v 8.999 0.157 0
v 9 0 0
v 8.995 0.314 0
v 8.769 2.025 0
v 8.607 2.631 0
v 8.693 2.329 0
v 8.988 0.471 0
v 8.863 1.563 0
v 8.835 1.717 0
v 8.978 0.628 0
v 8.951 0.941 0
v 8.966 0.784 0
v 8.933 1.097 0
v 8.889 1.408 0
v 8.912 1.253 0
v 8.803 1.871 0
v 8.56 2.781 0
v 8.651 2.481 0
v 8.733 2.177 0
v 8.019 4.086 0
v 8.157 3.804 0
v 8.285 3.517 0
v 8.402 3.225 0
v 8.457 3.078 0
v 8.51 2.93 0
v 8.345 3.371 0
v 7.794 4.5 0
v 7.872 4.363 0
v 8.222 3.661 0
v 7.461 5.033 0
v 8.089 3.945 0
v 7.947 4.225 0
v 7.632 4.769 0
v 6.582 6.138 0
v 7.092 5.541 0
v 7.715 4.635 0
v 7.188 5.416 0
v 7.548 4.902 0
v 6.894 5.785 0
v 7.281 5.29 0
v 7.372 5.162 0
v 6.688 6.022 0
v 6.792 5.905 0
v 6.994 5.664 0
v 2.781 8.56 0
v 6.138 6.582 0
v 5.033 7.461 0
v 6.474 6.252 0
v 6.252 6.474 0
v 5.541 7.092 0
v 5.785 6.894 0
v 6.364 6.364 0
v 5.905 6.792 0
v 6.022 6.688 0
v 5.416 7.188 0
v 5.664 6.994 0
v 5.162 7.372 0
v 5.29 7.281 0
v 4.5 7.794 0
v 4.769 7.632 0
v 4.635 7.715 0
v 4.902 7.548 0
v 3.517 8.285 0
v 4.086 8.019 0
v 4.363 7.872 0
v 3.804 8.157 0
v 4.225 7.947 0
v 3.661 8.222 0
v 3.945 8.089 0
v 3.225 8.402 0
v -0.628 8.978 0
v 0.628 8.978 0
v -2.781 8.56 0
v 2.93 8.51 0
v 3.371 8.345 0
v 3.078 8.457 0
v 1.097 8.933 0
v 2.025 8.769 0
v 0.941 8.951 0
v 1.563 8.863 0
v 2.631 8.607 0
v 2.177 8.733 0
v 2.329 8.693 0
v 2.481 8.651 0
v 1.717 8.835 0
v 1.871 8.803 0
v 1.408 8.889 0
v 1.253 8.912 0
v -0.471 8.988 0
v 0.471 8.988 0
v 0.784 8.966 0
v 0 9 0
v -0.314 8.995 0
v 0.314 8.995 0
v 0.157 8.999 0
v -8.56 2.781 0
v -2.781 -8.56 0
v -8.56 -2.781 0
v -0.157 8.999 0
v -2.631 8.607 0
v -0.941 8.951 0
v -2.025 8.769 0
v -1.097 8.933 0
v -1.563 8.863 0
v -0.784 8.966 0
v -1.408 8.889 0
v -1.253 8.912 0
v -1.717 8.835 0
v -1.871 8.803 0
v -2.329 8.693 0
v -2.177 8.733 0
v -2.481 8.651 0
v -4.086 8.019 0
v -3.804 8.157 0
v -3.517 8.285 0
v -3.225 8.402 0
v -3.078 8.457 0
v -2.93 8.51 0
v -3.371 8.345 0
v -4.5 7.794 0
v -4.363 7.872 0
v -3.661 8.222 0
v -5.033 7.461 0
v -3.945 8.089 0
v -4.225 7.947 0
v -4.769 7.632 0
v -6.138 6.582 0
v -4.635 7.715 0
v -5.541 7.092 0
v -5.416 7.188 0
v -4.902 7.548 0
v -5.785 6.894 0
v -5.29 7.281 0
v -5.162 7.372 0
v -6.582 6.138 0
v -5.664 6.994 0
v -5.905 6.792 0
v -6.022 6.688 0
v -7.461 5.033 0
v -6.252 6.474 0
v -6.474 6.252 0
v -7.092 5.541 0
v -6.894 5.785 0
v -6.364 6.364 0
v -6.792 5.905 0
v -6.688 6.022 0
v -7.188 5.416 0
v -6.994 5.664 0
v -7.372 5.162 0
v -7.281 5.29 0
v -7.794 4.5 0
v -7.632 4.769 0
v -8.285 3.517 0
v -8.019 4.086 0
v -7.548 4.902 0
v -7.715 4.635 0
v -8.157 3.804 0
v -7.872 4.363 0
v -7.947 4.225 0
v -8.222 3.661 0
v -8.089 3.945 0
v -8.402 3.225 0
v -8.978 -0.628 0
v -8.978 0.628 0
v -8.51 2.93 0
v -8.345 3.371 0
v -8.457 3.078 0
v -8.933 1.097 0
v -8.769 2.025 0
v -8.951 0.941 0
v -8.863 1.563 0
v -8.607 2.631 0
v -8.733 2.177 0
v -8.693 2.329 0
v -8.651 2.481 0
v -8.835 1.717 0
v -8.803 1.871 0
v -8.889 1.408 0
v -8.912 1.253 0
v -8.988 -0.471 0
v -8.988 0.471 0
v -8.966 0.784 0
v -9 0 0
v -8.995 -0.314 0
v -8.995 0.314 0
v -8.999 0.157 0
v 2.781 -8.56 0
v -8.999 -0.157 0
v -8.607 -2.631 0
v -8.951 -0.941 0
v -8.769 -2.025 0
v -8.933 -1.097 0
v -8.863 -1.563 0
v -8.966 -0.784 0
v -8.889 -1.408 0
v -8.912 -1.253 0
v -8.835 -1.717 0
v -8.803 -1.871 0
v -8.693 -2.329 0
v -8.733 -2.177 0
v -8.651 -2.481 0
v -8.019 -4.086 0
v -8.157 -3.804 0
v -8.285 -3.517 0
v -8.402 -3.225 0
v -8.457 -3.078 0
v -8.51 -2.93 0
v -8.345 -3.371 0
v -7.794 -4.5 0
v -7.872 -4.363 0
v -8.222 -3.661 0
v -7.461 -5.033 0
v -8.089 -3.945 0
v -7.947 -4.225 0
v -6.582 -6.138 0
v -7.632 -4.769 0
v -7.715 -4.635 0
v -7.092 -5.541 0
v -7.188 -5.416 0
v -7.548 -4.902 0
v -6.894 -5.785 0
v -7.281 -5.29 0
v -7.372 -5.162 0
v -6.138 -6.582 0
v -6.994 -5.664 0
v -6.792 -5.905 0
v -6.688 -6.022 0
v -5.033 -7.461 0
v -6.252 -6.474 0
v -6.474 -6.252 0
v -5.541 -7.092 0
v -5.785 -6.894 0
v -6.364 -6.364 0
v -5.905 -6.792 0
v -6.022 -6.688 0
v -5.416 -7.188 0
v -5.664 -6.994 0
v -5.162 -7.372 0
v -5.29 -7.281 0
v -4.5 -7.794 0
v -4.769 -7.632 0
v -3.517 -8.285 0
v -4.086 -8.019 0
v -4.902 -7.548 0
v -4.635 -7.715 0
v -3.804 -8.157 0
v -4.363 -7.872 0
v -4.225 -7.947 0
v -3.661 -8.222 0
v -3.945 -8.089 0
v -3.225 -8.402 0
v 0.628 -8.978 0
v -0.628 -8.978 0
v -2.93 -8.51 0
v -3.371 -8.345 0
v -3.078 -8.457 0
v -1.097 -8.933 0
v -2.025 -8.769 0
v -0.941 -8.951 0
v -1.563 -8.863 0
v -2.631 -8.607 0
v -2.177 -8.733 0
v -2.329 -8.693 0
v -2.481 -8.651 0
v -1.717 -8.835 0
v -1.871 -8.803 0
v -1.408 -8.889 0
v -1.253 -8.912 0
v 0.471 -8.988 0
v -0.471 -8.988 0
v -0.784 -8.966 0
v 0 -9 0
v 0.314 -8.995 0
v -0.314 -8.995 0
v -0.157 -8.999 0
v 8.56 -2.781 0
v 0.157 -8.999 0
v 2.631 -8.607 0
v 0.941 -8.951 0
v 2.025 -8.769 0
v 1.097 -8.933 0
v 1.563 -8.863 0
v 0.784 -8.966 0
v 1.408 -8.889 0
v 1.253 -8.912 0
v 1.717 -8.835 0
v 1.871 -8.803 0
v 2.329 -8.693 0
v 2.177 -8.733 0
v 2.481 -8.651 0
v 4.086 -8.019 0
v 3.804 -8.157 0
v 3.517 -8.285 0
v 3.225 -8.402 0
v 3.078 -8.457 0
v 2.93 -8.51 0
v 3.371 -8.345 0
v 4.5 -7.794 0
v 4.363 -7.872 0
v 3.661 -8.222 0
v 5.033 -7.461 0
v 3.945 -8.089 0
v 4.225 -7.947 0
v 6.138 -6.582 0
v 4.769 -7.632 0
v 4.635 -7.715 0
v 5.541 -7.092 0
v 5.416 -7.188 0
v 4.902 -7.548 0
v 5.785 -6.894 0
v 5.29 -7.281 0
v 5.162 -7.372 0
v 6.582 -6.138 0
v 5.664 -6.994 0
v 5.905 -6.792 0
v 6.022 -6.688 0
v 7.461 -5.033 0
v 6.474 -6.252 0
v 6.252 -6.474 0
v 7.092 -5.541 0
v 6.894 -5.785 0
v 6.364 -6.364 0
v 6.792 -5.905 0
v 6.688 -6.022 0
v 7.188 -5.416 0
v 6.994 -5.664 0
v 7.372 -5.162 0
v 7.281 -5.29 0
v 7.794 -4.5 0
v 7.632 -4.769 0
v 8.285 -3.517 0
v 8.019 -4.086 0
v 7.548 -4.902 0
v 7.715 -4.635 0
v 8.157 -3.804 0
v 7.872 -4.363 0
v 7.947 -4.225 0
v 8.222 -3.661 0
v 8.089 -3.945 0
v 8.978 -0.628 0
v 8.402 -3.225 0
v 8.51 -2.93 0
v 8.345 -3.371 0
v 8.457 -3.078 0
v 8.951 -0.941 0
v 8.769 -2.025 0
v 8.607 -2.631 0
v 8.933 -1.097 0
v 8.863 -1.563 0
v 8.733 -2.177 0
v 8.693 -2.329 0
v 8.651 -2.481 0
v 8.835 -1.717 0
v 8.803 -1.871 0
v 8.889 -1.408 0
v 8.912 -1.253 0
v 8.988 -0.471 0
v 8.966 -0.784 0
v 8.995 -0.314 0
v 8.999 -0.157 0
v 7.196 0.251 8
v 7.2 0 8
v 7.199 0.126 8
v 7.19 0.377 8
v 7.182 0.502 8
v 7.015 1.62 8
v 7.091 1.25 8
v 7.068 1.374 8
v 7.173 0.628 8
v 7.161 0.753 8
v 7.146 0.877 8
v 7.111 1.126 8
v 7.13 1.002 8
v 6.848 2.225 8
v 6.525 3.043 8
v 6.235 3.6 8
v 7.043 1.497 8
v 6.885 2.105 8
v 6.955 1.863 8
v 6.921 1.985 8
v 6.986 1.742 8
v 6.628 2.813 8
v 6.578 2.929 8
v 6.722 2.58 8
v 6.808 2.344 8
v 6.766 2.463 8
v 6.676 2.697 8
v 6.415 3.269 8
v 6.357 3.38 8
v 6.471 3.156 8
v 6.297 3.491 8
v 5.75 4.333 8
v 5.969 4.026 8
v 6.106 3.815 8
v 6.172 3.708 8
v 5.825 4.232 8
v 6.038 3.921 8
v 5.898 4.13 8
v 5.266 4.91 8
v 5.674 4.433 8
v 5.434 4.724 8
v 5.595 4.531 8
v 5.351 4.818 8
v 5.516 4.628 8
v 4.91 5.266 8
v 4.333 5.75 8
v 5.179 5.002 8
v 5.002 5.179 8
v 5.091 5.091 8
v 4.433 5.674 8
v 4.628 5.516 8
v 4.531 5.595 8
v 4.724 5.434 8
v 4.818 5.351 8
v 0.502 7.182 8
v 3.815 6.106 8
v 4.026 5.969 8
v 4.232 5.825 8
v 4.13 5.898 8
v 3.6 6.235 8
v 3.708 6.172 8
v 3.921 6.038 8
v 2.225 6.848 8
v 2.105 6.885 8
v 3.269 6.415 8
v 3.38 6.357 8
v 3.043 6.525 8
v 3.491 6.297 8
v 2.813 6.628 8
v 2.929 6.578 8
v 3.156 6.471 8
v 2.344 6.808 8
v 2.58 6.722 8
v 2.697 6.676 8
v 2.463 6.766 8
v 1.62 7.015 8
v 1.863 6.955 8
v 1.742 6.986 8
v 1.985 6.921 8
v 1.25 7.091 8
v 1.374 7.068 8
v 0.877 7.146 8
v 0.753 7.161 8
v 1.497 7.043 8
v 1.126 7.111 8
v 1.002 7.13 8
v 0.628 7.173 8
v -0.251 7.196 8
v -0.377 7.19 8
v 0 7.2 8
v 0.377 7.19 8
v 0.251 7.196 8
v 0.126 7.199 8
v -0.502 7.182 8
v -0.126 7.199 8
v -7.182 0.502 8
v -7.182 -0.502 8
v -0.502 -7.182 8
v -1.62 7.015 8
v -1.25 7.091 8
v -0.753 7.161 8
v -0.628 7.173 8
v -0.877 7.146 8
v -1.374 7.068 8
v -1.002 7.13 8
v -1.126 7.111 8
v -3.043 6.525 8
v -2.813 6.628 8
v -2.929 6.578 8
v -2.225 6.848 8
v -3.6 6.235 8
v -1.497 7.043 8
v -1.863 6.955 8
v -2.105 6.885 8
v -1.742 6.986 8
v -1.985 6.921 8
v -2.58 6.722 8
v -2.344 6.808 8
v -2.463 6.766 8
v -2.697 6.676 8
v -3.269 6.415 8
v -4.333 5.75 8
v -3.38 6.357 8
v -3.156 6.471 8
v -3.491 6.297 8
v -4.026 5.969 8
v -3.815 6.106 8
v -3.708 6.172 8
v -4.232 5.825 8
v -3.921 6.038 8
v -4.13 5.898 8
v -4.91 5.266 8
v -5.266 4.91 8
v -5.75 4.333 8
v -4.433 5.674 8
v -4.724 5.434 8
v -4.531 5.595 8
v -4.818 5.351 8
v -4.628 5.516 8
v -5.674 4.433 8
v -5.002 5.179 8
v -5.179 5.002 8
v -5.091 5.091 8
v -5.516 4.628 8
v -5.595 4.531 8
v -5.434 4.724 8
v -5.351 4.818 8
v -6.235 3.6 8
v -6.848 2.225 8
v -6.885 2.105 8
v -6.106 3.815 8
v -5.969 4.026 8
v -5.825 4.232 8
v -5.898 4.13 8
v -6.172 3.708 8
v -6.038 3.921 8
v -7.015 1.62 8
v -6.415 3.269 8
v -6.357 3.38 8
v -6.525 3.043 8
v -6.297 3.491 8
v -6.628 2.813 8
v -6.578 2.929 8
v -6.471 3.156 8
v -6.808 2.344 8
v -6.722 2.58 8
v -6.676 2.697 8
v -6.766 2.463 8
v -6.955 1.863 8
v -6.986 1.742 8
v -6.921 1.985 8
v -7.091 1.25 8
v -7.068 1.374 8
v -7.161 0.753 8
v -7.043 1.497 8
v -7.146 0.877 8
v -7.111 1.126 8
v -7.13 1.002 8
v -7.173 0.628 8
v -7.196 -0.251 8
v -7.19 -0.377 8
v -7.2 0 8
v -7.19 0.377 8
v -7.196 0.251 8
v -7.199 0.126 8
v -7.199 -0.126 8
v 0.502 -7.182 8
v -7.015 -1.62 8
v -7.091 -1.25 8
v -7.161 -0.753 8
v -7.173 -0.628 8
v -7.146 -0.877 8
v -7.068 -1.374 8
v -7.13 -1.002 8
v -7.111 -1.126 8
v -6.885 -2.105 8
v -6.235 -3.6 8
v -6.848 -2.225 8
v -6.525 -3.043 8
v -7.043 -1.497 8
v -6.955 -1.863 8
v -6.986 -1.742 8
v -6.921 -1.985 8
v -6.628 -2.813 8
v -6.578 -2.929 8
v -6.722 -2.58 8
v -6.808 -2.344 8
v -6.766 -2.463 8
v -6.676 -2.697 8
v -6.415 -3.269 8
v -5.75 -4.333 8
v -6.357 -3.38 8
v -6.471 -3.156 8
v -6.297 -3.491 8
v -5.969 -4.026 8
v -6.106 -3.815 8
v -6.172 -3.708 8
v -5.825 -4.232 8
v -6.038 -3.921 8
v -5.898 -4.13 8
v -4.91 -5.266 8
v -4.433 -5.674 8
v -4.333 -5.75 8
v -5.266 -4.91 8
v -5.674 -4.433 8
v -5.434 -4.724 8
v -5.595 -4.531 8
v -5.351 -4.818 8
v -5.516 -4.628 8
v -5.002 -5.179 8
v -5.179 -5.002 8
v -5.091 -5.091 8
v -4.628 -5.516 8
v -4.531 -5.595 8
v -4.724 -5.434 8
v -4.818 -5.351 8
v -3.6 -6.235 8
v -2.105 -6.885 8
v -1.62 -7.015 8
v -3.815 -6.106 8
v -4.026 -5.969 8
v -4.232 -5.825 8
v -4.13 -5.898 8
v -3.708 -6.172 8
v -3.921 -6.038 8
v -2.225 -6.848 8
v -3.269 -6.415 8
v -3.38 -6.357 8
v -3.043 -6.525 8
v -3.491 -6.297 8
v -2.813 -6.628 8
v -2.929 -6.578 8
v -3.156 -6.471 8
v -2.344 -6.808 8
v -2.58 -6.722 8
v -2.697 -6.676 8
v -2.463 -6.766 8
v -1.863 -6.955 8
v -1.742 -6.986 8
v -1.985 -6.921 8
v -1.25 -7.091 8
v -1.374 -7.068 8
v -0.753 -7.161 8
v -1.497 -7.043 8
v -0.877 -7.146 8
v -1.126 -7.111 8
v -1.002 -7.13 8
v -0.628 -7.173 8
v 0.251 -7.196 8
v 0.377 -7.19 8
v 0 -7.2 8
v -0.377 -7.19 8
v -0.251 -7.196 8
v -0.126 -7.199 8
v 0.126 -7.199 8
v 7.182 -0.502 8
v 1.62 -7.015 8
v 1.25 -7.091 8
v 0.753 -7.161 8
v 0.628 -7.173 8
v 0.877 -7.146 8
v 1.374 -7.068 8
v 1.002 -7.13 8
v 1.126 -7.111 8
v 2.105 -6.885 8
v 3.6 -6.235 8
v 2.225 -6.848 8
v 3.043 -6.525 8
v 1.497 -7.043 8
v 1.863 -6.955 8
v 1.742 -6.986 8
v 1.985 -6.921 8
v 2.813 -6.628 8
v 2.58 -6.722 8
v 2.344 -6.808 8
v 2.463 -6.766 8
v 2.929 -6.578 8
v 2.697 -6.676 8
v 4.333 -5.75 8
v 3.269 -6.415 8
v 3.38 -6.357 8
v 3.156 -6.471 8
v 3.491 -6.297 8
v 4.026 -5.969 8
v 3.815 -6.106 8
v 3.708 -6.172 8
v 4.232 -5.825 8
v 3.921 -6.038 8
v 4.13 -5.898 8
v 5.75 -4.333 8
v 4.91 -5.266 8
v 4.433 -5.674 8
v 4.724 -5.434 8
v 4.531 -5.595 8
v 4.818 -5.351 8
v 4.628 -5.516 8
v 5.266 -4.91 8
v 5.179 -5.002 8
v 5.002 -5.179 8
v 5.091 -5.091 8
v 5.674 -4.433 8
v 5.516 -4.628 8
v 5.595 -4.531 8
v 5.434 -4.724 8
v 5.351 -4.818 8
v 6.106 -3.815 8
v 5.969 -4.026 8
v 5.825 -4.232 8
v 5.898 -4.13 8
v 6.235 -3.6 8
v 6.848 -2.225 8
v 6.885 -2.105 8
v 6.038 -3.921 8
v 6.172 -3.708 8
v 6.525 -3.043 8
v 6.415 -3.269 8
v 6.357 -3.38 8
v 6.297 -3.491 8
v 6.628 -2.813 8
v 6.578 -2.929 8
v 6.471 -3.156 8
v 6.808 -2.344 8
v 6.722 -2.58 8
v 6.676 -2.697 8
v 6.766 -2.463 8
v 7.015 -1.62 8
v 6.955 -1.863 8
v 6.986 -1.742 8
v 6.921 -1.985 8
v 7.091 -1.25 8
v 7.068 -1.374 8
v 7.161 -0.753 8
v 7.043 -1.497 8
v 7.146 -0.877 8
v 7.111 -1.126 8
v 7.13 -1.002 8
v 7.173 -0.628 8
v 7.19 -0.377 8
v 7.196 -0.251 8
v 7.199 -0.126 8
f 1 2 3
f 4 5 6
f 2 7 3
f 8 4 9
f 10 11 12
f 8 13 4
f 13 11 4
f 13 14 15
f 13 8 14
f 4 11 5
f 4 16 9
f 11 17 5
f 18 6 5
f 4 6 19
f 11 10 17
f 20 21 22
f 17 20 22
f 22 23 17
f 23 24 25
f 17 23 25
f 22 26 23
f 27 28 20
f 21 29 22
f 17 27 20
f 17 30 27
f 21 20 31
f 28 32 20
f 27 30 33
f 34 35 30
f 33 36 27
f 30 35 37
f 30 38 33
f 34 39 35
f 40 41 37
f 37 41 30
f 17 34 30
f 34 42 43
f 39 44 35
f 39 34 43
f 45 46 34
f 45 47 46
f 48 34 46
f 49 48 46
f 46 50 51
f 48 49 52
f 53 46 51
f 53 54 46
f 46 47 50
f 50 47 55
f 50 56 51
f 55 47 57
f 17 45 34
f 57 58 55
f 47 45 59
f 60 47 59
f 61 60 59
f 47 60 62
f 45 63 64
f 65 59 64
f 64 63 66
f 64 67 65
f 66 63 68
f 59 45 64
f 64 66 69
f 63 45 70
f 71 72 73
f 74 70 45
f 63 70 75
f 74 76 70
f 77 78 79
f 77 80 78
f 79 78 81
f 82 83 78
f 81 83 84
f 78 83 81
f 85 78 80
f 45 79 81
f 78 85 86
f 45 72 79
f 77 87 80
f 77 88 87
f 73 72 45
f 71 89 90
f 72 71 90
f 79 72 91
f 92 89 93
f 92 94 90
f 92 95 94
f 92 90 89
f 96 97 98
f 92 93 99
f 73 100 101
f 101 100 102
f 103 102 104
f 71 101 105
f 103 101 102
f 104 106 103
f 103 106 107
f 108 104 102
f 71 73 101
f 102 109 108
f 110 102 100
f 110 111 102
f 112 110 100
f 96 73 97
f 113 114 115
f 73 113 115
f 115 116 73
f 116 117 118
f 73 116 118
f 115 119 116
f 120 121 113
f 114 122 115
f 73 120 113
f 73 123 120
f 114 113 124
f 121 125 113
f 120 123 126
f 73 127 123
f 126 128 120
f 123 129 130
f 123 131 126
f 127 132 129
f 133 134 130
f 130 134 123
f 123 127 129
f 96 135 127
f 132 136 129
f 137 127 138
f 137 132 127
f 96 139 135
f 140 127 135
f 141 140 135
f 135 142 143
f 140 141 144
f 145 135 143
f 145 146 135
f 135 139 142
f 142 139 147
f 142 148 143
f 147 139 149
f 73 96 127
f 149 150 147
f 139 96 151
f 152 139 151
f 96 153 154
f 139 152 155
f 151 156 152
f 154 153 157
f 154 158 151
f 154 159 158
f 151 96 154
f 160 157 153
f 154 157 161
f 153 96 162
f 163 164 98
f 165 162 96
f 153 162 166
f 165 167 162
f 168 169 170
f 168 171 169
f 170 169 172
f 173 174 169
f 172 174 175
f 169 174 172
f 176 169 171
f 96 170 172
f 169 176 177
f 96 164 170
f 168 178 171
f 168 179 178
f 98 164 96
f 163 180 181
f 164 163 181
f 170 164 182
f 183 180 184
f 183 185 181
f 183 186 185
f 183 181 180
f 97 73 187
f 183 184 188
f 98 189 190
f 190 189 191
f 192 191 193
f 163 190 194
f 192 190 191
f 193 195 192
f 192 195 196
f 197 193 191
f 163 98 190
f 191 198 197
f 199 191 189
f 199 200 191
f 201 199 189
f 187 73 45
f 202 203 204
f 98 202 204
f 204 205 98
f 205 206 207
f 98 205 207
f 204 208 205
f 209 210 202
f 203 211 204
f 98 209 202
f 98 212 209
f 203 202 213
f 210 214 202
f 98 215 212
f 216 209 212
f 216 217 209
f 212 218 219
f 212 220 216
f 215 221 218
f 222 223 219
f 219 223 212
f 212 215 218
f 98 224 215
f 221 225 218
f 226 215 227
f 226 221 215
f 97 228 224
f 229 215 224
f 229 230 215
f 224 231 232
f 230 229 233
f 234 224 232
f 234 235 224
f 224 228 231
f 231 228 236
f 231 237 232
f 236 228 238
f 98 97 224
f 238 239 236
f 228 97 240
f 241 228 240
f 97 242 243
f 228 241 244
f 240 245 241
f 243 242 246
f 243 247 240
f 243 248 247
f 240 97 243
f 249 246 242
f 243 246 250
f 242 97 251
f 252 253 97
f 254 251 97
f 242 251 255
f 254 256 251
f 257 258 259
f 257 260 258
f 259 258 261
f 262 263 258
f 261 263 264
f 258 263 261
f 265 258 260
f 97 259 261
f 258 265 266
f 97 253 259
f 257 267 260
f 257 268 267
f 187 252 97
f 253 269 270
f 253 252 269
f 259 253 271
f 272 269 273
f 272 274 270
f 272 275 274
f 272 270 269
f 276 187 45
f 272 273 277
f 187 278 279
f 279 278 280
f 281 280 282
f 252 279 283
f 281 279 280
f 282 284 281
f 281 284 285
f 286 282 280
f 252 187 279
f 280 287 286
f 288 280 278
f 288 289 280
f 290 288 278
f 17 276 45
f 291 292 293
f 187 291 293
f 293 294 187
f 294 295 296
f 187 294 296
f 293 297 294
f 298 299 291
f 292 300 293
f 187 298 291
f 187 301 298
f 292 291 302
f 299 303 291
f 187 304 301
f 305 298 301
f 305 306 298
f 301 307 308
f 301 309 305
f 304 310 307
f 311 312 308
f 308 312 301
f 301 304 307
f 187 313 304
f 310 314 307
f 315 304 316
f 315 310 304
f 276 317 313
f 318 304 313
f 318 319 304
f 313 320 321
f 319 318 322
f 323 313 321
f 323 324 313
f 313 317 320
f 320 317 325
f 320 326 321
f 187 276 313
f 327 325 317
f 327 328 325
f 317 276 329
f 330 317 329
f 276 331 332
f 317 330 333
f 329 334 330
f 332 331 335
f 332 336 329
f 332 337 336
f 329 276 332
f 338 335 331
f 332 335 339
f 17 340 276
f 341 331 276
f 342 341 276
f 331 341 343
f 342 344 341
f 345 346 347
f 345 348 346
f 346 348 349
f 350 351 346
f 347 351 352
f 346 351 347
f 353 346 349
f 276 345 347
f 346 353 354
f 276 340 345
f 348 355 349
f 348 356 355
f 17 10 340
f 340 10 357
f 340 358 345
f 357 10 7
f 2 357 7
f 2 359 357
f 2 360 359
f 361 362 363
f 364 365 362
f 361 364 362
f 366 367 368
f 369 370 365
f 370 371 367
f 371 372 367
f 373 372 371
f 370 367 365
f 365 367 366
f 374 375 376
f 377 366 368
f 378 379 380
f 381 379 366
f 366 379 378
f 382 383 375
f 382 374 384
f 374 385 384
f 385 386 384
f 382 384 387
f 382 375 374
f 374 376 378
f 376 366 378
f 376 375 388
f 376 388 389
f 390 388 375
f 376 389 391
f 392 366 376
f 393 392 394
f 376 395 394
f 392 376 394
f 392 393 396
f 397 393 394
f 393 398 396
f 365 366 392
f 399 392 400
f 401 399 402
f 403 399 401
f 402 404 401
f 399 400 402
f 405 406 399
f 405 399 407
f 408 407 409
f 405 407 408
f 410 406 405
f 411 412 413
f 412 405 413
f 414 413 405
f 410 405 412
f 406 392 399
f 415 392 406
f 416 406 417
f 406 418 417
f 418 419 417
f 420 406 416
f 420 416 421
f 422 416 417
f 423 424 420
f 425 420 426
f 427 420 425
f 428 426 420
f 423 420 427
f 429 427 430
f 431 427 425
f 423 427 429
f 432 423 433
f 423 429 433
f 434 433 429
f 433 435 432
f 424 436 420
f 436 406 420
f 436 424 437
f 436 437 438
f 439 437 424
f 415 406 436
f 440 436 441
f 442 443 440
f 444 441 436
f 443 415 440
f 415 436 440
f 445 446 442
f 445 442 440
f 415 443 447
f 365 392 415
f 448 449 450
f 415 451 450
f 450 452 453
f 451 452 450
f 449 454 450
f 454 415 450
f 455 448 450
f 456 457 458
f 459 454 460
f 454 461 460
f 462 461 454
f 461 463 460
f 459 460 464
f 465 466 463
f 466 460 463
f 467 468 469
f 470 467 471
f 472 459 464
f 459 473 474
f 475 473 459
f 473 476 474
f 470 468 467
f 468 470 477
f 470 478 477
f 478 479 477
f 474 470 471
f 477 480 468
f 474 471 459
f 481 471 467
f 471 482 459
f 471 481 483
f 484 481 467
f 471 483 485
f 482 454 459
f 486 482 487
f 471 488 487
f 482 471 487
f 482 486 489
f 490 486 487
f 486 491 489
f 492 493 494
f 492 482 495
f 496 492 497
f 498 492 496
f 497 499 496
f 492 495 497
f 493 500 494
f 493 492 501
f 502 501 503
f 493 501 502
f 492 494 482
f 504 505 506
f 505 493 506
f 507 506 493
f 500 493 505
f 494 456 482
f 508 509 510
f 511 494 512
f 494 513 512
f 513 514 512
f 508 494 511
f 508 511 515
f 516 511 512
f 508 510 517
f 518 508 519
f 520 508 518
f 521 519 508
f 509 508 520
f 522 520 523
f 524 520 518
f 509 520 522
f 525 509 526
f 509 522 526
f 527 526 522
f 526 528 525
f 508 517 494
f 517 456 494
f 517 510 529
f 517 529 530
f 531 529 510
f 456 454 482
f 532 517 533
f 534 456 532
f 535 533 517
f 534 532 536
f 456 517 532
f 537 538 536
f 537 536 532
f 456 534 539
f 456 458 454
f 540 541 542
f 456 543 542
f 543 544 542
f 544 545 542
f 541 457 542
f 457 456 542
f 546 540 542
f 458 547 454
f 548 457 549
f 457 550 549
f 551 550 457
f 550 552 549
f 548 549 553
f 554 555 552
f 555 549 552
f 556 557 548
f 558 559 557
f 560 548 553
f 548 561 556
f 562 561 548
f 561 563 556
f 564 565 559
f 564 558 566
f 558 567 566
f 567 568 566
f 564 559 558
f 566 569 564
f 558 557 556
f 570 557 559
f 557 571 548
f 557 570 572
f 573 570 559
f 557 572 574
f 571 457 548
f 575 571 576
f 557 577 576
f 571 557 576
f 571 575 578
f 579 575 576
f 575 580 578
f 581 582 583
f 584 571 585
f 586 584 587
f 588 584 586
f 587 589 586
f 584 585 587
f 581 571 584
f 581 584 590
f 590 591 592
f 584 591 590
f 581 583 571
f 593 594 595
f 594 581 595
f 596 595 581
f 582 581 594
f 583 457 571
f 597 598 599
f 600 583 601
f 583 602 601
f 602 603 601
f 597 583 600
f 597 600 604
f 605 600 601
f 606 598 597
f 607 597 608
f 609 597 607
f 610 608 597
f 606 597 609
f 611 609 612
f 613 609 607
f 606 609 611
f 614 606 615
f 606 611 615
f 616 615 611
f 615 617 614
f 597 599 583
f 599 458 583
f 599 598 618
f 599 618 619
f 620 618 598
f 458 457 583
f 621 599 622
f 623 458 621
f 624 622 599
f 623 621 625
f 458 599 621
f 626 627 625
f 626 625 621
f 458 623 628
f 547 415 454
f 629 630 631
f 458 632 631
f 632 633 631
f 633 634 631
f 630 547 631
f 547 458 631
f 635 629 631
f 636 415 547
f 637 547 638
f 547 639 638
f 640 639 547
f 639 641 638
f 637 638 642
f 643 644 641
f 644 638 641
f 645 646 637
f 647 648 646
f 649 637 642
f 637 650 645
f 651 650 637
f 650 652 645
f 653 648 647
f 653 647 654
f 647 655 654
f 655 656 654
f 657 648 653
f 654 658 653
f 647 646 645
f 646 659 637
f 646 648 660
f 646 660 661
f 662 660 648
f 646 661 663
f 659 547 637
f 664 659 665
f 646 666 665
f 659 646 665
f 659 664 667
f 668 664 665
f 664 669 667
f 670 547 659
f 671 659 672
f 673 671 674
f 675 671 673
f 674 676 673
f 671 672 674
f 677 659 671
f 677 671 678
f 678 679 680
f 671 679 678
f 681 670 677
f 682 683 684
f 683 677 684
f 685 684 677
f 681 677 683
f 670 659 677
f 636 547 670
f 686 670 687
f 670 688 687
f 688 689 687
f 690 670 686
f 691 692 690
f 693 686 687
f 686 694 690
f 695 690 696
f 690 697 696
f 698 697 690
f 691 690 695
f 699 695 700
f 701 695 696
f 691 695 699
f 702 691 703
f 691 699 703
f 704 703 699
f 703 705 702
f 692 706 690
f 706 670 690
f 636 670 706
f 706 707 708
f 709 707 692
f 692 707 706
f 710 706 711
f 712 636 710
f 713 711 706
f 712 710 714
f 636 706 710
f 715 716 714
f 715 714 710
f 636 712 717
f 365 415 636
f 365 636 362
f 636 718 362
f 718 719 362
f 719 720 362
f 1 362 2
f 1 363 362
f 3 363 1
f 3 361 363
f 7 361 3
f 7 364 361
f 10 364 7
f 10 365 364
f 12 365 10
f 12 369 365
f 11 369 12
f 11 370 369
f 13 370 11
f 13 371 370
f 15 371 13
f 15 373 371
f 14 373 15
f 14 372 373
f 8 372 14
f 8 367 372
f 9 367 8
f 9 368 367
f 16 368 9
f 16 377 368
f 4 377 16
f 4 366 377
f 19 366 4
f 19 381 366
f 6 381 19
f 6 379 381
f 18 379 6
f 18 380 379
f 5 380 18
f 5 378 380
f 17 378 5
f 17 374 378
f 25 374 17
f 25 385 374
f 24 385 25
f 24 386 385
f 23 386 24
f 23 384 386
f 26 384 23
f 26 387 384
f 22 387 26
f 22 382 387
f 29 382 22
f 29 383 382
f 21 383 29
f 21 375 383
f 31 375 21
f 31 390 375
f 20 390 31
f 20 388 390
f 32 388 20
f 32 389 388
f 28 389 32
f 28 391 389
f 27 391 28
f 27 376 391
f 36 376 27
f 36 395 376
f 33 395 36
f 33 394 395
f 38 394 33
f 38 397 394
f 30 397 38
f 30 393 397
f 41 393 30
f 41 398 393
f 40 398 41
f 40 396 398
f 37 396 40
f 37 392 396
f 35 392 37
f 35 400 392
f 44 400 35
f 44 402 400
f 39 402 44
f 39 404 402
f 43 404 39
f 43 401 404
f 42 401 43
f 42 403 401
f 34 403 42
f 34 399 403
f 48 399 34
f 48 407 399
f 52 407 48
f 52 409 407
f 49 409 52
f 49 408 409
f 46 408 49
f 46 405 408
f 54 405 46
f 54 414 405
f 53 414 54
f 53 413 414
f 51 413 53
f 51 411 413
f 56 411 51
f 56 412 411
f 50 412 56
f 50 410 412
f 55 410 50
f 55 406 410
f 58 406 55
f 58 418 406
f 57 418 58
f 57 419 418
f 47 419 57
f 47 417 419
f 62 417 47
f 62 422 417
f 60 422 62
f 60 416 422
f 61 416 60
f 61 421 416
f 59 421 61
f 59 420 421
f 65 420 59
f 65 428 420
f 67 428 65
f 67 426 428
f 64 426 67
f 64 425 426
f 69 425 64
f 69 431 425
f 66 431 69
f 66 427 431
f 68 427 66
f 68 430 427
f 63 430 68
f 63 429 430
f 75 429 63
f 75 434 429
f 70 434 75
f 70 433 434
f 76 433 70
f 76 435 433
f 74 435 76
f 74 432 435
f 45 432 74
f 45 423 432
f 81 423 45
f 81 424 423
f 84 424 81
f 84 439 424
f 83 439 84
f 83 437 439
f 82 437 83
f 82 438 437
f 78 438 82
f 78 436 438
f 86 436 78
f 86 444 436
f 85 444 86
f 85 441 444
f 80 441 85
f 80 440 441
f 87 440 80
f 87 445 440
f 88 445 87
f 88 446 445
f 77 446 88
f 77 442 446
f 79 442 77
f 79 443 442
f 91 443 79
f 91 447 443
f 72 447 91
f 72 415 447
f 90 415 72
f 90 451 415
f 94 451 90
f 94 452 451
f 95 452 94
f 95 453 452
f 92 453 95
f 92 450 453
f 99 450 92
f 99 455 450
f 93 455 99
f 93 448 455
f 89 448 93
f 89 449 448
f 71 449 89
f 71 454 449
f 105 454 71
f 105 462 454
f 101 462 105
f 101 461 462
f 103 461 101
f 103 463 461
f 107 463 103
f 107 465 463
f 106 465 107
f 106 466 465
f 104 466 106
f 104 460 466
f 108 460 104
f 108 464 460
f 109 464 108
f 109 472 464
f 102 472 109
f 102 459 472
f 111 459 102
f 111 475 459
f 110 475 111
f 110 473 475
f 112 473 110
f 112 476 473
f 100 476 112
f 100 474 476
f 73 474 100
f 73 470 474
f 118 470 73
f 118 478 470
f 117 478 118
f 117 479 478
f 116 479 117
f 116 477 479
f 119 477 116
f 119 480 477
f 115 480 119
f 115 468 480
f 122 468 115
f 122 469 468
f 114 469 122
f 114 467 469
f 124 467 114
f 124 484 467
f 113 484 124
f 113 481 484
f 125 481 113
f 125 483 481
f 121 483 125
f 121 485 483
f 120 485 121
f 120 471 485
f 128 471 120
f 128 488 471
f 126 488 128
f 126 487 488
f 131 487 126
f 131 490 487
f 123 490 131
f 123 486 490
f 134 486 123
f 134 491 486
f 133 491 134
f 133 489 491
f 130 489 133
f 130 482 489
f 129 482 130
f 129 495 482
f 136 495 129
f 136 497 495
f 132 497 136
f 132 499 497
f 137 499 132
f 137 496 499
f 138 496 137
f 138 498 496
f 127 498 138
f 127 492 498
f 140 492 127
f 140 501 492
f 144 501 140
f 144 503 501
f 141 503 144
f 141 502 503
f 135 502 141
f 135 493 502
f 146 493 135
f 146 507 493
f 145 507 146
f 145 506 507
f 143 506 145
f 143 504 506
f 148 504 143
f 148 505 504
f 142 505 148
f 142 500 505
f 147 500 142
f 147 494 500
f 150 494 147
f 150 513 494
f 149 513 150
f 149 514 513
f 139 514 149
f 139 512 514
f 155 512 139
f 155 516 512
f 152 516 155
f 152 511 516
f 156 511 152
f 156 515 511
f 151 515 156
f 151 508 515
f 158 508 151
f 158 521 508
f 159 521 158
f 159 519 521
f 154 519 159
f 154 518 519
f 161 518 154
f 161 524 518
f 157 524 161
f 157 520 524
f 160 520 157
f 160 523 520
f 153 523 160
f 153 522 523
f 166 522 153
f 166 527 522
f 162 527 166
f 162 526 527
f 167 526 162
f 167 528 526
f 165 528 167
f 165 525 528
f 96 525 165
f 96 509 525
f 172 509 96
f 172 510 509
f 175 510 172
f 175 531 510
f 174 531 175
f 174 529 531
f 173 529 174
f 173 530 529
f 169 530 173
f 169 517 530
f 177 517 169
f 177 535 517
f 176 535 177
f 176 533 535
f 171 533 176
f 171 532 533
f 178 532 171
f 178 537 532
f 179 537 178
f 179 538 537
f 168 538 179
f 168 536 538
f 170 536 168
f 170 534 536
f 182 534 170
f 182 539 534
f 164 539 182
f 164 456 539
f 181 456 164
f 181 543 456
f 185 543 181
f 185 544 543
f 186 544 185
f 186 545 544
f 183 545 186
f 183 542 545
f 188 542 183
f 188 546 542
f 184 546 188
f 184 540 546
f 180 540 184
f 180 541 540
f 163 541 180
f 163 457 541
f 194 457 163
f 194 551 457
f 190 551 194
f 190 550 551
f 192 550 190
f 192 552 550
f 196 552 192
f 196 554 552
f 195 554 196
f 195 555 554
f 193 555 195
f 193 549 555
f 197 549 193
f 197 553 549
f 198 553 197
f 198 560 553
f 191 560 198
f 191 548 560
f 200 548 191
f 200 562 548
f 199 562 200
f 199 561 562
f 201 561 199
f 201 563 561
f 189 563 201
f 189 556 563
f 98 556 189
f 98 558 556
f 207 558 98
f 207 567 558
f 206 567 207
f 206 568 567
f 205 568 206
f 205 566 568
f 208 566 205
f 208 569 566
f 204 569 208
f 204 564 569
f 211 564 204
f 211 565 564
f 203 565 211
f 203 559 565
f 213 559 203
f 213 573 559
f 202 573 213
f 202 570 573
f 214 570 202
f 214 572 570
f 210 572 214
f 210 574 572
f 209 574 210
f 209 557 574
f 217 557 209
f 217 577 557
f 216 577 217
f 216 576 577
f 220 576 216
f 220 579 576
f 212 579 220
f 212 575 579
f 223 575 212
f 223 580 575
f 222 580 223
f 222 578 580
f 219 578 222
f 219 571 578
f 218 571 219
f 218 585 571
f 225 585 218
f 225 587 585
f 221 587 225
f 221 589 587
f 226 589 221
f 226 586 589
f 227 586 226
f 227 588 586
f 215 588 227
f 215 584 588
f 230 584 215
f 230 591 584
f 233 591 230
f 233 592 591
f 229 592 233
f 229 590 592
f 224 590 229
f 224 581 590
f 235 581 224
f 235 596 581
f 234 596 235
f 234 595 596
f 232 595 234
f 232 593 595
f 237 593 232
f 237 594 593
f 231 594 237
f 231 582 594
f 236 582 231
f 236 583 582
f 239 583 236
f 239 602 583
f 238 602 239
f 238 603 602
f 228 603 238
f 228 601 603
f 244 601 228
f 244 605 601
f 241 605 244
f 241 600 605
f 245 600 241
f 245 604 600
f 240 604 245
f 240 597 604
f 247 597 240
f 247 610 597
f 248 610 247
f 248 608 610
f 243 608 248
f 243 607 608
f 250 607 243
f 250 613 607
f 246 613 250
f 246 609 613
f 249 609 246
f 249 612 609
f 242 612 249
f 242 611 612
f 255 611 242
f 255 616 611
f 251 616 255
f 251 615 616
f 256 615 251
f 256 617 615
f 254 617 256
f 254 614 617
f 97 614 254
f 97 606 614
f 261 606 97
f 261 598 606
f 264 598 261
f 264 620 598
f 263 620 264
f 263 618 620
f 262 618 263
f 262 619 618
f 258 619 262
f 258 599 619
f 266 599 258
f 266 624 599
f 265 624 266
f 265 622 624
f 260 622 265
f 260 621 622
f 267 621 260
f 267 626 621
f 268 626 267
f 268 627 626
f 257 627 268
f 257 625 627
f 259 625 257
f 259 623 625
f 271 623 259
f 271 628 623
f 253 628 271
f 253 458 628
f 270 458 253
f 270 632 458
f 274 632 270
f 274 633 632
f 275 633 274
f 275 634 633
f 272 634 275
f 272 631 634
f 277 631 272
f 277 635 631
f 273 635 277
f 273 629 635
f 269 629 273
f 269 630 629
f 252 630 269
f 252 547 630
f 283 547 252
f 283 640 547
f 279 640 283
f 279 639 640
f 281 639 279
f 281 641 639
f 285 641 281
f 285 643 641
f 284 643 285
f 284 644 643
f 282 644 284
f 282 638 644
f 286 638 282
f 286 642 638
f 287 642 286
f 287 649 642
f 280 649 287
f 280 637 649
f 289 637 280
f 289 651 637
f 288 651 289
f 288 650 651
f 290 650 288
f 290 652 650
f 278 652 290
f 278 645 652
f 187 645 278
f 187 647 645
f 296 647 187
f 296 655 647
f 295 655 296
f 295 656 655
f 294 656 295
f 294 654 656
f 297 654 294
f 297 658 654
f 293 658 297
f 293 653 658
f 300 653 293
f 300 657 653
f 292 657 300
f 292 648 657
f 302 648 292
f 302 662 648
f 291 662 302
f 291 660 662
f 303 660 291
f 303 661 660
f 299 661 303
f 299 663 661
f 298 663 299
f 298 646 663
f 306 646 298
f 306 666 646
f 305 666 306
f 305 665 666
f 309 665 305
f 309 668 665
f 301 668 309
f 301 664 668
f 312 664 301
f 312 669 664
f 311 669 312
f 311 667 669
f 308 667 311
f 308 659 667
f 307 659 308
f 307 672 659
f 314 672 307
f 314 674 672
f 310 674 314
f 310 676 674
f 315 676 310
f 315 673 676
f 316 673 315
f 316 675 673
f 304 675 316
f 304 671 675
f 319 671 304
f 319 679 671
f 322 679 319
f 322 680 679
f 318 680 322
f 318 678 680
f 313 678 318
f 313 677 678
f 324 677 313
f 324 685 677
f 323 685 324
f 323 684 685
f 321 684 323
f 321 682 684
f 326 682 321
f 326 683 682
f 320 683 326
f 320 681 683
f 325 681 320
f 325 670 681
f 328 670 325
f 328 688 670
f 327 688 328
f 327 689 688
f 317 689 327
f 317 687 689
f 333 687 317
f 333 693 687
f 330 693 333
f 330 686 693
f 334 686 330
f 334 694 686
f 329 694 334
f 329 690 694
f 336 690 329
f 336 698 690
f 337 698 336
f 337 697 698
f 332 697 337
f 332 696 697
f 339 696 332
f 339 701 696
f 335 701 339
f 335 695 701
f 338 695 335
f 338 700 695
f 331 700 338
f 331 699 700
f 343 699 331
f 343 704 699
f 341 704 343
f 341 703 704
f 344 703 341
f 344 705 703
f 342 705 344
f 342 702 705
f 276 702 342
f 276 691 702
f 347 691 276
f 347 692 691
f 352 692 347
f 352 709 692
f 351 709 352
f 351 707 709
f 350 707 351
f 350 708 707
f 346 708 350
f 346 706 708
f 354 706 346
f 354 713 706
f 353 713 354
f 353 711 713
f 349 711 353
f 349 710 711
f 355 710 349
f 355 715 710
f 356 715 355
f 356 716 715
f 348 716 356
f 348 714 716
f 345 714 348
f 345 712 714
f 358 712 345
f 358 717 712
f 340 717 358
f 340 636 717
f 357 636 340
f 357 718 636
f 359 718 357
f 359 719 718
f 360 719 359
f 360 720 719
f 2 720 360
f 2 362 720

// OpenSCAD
// file: common.scad
function shaft() = 3.77;
function nut_width() = 6.5;
function nut_thickness() = 3;
function screw_diameter() =3.25;
function m3_cap_diameter() = 5.5;
function m3_cap_height() = 3.5;

module hex_cap(){
  difference(){
    cylinder(d=3.66, h=3);
    translate([0, 0, 1.25]) cylinder(d=2, h=2, $fn=6);
  }
}

module inverse_hex_cap(){
  cylinder(d=3.66, h=0.5, $fn=360);
  cylinder(d=2, h=1, $fn=6);
}

module nema17_end(top=true, shaft_length=25.6){
  $fn=360;
  difference(){
	 union(){
      linear_extrude(height = 9){
        difference(){
          hull(){
            translate([2, 2, 0]) circle(r=2);
            translate([40.3, 2, 0]) circle(r=2);
            translate([40.3, 40.3, 0]) circle(r=2);
            translate([2, 40.3, 0]) circle(r=2);
	       }
          translate([5.65, 5.65, 0]) circle(d = screw_diameter());
          translate([36.65, 5.65, 0]) circle(d = screw_diameter());
          translate([5.65, 36.65, 0]) circle(d = screw_diameter());
          translate([36.65, 36.65, 0]) circle(d = screw_diameter());
	      }	
	    }
       if (top){
         translate([21.15, 21.15, 9]){
           difference(){
		       cylinder(d=22, h=2);
		       translate([0, 0, -0.5]) cylinder(d=6.5, h=3.5);
		     }
		     translate([0, 0, -0.6]) cylinder(d=5.5, h=shaft_length);
			}
		 }
	  }
	  if (!top){
		  translate([21.15, 21.15, -1]){
			  cylinder(d=7, h=3);
		  }
	  }
	}
}

module nema17_slice(wide=true, height=18){
  $fn=360;
  linear_extrude(height){
    difference(){
      hull(){
        translate([wide?1:2, wide?6.65:7.65, 0]) circle(r=1);
        translate([wide?6.65:7.65, wide?1:2, 0]) circle(r=1);
        translate([wide?37.65:36.65, wide?1:2, 0]) circle(r=1);
        translate([wide?41.3:40.3, wide?6.65:7.65, 0]) circle(r=1);
        translate([wide?41.3:40.3, wide?35.65:34.65, 0]) circle(r=1);
        translate([wide?35.65:34.65, wide?41.3:40.3, 0]) circle(r=1);
        translate([wide?6.65:7.65, wide?41.3:40.3, 0]) circle(r=1);
        translate([wide?1:2, wide?35.65:34.65, 0]) circle(r=1);
      }
      translate([5.65, 5.65, 0]) circle(d = screw_diameter());
      translate([36.65, 5.65, 0]) circle(d = screw_diameter());
      translate([5.65, 36.65, 0]) circle(d = screw_diameter());
      translate([36.65, 36.65, 0]) circle(d = screw_diameter());
    }
  }
}

module nema_17(texture_sides=true, shaft_length=25.6){
  translate([0, 0, 0]) nema17_end(top=false);
  translate([0, 0, 27]) nema17_end(top=true, shaft_length=shaft_length);
  if (texture_sides){
    for (h = [9:1:27]){
	   translate([0, 0, h]) nema17_slice(height = 1, wide=(h%2));
	 }
  } else {
    translate([0, 0, 9]) nema17_slice();
  }
}
// main file
use <common.scad>

$fn=360;

module circle_foot(screw = false){
  difference(){
    linear_extrude(height=8, scale=0.8) circle(9);
    if (screw){
      translate([0, 0, -1]) cylinder(d=screw_diameter(), h=10);
      translate([0, 0, 8 - m3_cap_height()]) cylinder(d=m3_cap_diameter(), h=m3_cap_height()+1);
    }
  }
}

circle_foot(screw = false);
